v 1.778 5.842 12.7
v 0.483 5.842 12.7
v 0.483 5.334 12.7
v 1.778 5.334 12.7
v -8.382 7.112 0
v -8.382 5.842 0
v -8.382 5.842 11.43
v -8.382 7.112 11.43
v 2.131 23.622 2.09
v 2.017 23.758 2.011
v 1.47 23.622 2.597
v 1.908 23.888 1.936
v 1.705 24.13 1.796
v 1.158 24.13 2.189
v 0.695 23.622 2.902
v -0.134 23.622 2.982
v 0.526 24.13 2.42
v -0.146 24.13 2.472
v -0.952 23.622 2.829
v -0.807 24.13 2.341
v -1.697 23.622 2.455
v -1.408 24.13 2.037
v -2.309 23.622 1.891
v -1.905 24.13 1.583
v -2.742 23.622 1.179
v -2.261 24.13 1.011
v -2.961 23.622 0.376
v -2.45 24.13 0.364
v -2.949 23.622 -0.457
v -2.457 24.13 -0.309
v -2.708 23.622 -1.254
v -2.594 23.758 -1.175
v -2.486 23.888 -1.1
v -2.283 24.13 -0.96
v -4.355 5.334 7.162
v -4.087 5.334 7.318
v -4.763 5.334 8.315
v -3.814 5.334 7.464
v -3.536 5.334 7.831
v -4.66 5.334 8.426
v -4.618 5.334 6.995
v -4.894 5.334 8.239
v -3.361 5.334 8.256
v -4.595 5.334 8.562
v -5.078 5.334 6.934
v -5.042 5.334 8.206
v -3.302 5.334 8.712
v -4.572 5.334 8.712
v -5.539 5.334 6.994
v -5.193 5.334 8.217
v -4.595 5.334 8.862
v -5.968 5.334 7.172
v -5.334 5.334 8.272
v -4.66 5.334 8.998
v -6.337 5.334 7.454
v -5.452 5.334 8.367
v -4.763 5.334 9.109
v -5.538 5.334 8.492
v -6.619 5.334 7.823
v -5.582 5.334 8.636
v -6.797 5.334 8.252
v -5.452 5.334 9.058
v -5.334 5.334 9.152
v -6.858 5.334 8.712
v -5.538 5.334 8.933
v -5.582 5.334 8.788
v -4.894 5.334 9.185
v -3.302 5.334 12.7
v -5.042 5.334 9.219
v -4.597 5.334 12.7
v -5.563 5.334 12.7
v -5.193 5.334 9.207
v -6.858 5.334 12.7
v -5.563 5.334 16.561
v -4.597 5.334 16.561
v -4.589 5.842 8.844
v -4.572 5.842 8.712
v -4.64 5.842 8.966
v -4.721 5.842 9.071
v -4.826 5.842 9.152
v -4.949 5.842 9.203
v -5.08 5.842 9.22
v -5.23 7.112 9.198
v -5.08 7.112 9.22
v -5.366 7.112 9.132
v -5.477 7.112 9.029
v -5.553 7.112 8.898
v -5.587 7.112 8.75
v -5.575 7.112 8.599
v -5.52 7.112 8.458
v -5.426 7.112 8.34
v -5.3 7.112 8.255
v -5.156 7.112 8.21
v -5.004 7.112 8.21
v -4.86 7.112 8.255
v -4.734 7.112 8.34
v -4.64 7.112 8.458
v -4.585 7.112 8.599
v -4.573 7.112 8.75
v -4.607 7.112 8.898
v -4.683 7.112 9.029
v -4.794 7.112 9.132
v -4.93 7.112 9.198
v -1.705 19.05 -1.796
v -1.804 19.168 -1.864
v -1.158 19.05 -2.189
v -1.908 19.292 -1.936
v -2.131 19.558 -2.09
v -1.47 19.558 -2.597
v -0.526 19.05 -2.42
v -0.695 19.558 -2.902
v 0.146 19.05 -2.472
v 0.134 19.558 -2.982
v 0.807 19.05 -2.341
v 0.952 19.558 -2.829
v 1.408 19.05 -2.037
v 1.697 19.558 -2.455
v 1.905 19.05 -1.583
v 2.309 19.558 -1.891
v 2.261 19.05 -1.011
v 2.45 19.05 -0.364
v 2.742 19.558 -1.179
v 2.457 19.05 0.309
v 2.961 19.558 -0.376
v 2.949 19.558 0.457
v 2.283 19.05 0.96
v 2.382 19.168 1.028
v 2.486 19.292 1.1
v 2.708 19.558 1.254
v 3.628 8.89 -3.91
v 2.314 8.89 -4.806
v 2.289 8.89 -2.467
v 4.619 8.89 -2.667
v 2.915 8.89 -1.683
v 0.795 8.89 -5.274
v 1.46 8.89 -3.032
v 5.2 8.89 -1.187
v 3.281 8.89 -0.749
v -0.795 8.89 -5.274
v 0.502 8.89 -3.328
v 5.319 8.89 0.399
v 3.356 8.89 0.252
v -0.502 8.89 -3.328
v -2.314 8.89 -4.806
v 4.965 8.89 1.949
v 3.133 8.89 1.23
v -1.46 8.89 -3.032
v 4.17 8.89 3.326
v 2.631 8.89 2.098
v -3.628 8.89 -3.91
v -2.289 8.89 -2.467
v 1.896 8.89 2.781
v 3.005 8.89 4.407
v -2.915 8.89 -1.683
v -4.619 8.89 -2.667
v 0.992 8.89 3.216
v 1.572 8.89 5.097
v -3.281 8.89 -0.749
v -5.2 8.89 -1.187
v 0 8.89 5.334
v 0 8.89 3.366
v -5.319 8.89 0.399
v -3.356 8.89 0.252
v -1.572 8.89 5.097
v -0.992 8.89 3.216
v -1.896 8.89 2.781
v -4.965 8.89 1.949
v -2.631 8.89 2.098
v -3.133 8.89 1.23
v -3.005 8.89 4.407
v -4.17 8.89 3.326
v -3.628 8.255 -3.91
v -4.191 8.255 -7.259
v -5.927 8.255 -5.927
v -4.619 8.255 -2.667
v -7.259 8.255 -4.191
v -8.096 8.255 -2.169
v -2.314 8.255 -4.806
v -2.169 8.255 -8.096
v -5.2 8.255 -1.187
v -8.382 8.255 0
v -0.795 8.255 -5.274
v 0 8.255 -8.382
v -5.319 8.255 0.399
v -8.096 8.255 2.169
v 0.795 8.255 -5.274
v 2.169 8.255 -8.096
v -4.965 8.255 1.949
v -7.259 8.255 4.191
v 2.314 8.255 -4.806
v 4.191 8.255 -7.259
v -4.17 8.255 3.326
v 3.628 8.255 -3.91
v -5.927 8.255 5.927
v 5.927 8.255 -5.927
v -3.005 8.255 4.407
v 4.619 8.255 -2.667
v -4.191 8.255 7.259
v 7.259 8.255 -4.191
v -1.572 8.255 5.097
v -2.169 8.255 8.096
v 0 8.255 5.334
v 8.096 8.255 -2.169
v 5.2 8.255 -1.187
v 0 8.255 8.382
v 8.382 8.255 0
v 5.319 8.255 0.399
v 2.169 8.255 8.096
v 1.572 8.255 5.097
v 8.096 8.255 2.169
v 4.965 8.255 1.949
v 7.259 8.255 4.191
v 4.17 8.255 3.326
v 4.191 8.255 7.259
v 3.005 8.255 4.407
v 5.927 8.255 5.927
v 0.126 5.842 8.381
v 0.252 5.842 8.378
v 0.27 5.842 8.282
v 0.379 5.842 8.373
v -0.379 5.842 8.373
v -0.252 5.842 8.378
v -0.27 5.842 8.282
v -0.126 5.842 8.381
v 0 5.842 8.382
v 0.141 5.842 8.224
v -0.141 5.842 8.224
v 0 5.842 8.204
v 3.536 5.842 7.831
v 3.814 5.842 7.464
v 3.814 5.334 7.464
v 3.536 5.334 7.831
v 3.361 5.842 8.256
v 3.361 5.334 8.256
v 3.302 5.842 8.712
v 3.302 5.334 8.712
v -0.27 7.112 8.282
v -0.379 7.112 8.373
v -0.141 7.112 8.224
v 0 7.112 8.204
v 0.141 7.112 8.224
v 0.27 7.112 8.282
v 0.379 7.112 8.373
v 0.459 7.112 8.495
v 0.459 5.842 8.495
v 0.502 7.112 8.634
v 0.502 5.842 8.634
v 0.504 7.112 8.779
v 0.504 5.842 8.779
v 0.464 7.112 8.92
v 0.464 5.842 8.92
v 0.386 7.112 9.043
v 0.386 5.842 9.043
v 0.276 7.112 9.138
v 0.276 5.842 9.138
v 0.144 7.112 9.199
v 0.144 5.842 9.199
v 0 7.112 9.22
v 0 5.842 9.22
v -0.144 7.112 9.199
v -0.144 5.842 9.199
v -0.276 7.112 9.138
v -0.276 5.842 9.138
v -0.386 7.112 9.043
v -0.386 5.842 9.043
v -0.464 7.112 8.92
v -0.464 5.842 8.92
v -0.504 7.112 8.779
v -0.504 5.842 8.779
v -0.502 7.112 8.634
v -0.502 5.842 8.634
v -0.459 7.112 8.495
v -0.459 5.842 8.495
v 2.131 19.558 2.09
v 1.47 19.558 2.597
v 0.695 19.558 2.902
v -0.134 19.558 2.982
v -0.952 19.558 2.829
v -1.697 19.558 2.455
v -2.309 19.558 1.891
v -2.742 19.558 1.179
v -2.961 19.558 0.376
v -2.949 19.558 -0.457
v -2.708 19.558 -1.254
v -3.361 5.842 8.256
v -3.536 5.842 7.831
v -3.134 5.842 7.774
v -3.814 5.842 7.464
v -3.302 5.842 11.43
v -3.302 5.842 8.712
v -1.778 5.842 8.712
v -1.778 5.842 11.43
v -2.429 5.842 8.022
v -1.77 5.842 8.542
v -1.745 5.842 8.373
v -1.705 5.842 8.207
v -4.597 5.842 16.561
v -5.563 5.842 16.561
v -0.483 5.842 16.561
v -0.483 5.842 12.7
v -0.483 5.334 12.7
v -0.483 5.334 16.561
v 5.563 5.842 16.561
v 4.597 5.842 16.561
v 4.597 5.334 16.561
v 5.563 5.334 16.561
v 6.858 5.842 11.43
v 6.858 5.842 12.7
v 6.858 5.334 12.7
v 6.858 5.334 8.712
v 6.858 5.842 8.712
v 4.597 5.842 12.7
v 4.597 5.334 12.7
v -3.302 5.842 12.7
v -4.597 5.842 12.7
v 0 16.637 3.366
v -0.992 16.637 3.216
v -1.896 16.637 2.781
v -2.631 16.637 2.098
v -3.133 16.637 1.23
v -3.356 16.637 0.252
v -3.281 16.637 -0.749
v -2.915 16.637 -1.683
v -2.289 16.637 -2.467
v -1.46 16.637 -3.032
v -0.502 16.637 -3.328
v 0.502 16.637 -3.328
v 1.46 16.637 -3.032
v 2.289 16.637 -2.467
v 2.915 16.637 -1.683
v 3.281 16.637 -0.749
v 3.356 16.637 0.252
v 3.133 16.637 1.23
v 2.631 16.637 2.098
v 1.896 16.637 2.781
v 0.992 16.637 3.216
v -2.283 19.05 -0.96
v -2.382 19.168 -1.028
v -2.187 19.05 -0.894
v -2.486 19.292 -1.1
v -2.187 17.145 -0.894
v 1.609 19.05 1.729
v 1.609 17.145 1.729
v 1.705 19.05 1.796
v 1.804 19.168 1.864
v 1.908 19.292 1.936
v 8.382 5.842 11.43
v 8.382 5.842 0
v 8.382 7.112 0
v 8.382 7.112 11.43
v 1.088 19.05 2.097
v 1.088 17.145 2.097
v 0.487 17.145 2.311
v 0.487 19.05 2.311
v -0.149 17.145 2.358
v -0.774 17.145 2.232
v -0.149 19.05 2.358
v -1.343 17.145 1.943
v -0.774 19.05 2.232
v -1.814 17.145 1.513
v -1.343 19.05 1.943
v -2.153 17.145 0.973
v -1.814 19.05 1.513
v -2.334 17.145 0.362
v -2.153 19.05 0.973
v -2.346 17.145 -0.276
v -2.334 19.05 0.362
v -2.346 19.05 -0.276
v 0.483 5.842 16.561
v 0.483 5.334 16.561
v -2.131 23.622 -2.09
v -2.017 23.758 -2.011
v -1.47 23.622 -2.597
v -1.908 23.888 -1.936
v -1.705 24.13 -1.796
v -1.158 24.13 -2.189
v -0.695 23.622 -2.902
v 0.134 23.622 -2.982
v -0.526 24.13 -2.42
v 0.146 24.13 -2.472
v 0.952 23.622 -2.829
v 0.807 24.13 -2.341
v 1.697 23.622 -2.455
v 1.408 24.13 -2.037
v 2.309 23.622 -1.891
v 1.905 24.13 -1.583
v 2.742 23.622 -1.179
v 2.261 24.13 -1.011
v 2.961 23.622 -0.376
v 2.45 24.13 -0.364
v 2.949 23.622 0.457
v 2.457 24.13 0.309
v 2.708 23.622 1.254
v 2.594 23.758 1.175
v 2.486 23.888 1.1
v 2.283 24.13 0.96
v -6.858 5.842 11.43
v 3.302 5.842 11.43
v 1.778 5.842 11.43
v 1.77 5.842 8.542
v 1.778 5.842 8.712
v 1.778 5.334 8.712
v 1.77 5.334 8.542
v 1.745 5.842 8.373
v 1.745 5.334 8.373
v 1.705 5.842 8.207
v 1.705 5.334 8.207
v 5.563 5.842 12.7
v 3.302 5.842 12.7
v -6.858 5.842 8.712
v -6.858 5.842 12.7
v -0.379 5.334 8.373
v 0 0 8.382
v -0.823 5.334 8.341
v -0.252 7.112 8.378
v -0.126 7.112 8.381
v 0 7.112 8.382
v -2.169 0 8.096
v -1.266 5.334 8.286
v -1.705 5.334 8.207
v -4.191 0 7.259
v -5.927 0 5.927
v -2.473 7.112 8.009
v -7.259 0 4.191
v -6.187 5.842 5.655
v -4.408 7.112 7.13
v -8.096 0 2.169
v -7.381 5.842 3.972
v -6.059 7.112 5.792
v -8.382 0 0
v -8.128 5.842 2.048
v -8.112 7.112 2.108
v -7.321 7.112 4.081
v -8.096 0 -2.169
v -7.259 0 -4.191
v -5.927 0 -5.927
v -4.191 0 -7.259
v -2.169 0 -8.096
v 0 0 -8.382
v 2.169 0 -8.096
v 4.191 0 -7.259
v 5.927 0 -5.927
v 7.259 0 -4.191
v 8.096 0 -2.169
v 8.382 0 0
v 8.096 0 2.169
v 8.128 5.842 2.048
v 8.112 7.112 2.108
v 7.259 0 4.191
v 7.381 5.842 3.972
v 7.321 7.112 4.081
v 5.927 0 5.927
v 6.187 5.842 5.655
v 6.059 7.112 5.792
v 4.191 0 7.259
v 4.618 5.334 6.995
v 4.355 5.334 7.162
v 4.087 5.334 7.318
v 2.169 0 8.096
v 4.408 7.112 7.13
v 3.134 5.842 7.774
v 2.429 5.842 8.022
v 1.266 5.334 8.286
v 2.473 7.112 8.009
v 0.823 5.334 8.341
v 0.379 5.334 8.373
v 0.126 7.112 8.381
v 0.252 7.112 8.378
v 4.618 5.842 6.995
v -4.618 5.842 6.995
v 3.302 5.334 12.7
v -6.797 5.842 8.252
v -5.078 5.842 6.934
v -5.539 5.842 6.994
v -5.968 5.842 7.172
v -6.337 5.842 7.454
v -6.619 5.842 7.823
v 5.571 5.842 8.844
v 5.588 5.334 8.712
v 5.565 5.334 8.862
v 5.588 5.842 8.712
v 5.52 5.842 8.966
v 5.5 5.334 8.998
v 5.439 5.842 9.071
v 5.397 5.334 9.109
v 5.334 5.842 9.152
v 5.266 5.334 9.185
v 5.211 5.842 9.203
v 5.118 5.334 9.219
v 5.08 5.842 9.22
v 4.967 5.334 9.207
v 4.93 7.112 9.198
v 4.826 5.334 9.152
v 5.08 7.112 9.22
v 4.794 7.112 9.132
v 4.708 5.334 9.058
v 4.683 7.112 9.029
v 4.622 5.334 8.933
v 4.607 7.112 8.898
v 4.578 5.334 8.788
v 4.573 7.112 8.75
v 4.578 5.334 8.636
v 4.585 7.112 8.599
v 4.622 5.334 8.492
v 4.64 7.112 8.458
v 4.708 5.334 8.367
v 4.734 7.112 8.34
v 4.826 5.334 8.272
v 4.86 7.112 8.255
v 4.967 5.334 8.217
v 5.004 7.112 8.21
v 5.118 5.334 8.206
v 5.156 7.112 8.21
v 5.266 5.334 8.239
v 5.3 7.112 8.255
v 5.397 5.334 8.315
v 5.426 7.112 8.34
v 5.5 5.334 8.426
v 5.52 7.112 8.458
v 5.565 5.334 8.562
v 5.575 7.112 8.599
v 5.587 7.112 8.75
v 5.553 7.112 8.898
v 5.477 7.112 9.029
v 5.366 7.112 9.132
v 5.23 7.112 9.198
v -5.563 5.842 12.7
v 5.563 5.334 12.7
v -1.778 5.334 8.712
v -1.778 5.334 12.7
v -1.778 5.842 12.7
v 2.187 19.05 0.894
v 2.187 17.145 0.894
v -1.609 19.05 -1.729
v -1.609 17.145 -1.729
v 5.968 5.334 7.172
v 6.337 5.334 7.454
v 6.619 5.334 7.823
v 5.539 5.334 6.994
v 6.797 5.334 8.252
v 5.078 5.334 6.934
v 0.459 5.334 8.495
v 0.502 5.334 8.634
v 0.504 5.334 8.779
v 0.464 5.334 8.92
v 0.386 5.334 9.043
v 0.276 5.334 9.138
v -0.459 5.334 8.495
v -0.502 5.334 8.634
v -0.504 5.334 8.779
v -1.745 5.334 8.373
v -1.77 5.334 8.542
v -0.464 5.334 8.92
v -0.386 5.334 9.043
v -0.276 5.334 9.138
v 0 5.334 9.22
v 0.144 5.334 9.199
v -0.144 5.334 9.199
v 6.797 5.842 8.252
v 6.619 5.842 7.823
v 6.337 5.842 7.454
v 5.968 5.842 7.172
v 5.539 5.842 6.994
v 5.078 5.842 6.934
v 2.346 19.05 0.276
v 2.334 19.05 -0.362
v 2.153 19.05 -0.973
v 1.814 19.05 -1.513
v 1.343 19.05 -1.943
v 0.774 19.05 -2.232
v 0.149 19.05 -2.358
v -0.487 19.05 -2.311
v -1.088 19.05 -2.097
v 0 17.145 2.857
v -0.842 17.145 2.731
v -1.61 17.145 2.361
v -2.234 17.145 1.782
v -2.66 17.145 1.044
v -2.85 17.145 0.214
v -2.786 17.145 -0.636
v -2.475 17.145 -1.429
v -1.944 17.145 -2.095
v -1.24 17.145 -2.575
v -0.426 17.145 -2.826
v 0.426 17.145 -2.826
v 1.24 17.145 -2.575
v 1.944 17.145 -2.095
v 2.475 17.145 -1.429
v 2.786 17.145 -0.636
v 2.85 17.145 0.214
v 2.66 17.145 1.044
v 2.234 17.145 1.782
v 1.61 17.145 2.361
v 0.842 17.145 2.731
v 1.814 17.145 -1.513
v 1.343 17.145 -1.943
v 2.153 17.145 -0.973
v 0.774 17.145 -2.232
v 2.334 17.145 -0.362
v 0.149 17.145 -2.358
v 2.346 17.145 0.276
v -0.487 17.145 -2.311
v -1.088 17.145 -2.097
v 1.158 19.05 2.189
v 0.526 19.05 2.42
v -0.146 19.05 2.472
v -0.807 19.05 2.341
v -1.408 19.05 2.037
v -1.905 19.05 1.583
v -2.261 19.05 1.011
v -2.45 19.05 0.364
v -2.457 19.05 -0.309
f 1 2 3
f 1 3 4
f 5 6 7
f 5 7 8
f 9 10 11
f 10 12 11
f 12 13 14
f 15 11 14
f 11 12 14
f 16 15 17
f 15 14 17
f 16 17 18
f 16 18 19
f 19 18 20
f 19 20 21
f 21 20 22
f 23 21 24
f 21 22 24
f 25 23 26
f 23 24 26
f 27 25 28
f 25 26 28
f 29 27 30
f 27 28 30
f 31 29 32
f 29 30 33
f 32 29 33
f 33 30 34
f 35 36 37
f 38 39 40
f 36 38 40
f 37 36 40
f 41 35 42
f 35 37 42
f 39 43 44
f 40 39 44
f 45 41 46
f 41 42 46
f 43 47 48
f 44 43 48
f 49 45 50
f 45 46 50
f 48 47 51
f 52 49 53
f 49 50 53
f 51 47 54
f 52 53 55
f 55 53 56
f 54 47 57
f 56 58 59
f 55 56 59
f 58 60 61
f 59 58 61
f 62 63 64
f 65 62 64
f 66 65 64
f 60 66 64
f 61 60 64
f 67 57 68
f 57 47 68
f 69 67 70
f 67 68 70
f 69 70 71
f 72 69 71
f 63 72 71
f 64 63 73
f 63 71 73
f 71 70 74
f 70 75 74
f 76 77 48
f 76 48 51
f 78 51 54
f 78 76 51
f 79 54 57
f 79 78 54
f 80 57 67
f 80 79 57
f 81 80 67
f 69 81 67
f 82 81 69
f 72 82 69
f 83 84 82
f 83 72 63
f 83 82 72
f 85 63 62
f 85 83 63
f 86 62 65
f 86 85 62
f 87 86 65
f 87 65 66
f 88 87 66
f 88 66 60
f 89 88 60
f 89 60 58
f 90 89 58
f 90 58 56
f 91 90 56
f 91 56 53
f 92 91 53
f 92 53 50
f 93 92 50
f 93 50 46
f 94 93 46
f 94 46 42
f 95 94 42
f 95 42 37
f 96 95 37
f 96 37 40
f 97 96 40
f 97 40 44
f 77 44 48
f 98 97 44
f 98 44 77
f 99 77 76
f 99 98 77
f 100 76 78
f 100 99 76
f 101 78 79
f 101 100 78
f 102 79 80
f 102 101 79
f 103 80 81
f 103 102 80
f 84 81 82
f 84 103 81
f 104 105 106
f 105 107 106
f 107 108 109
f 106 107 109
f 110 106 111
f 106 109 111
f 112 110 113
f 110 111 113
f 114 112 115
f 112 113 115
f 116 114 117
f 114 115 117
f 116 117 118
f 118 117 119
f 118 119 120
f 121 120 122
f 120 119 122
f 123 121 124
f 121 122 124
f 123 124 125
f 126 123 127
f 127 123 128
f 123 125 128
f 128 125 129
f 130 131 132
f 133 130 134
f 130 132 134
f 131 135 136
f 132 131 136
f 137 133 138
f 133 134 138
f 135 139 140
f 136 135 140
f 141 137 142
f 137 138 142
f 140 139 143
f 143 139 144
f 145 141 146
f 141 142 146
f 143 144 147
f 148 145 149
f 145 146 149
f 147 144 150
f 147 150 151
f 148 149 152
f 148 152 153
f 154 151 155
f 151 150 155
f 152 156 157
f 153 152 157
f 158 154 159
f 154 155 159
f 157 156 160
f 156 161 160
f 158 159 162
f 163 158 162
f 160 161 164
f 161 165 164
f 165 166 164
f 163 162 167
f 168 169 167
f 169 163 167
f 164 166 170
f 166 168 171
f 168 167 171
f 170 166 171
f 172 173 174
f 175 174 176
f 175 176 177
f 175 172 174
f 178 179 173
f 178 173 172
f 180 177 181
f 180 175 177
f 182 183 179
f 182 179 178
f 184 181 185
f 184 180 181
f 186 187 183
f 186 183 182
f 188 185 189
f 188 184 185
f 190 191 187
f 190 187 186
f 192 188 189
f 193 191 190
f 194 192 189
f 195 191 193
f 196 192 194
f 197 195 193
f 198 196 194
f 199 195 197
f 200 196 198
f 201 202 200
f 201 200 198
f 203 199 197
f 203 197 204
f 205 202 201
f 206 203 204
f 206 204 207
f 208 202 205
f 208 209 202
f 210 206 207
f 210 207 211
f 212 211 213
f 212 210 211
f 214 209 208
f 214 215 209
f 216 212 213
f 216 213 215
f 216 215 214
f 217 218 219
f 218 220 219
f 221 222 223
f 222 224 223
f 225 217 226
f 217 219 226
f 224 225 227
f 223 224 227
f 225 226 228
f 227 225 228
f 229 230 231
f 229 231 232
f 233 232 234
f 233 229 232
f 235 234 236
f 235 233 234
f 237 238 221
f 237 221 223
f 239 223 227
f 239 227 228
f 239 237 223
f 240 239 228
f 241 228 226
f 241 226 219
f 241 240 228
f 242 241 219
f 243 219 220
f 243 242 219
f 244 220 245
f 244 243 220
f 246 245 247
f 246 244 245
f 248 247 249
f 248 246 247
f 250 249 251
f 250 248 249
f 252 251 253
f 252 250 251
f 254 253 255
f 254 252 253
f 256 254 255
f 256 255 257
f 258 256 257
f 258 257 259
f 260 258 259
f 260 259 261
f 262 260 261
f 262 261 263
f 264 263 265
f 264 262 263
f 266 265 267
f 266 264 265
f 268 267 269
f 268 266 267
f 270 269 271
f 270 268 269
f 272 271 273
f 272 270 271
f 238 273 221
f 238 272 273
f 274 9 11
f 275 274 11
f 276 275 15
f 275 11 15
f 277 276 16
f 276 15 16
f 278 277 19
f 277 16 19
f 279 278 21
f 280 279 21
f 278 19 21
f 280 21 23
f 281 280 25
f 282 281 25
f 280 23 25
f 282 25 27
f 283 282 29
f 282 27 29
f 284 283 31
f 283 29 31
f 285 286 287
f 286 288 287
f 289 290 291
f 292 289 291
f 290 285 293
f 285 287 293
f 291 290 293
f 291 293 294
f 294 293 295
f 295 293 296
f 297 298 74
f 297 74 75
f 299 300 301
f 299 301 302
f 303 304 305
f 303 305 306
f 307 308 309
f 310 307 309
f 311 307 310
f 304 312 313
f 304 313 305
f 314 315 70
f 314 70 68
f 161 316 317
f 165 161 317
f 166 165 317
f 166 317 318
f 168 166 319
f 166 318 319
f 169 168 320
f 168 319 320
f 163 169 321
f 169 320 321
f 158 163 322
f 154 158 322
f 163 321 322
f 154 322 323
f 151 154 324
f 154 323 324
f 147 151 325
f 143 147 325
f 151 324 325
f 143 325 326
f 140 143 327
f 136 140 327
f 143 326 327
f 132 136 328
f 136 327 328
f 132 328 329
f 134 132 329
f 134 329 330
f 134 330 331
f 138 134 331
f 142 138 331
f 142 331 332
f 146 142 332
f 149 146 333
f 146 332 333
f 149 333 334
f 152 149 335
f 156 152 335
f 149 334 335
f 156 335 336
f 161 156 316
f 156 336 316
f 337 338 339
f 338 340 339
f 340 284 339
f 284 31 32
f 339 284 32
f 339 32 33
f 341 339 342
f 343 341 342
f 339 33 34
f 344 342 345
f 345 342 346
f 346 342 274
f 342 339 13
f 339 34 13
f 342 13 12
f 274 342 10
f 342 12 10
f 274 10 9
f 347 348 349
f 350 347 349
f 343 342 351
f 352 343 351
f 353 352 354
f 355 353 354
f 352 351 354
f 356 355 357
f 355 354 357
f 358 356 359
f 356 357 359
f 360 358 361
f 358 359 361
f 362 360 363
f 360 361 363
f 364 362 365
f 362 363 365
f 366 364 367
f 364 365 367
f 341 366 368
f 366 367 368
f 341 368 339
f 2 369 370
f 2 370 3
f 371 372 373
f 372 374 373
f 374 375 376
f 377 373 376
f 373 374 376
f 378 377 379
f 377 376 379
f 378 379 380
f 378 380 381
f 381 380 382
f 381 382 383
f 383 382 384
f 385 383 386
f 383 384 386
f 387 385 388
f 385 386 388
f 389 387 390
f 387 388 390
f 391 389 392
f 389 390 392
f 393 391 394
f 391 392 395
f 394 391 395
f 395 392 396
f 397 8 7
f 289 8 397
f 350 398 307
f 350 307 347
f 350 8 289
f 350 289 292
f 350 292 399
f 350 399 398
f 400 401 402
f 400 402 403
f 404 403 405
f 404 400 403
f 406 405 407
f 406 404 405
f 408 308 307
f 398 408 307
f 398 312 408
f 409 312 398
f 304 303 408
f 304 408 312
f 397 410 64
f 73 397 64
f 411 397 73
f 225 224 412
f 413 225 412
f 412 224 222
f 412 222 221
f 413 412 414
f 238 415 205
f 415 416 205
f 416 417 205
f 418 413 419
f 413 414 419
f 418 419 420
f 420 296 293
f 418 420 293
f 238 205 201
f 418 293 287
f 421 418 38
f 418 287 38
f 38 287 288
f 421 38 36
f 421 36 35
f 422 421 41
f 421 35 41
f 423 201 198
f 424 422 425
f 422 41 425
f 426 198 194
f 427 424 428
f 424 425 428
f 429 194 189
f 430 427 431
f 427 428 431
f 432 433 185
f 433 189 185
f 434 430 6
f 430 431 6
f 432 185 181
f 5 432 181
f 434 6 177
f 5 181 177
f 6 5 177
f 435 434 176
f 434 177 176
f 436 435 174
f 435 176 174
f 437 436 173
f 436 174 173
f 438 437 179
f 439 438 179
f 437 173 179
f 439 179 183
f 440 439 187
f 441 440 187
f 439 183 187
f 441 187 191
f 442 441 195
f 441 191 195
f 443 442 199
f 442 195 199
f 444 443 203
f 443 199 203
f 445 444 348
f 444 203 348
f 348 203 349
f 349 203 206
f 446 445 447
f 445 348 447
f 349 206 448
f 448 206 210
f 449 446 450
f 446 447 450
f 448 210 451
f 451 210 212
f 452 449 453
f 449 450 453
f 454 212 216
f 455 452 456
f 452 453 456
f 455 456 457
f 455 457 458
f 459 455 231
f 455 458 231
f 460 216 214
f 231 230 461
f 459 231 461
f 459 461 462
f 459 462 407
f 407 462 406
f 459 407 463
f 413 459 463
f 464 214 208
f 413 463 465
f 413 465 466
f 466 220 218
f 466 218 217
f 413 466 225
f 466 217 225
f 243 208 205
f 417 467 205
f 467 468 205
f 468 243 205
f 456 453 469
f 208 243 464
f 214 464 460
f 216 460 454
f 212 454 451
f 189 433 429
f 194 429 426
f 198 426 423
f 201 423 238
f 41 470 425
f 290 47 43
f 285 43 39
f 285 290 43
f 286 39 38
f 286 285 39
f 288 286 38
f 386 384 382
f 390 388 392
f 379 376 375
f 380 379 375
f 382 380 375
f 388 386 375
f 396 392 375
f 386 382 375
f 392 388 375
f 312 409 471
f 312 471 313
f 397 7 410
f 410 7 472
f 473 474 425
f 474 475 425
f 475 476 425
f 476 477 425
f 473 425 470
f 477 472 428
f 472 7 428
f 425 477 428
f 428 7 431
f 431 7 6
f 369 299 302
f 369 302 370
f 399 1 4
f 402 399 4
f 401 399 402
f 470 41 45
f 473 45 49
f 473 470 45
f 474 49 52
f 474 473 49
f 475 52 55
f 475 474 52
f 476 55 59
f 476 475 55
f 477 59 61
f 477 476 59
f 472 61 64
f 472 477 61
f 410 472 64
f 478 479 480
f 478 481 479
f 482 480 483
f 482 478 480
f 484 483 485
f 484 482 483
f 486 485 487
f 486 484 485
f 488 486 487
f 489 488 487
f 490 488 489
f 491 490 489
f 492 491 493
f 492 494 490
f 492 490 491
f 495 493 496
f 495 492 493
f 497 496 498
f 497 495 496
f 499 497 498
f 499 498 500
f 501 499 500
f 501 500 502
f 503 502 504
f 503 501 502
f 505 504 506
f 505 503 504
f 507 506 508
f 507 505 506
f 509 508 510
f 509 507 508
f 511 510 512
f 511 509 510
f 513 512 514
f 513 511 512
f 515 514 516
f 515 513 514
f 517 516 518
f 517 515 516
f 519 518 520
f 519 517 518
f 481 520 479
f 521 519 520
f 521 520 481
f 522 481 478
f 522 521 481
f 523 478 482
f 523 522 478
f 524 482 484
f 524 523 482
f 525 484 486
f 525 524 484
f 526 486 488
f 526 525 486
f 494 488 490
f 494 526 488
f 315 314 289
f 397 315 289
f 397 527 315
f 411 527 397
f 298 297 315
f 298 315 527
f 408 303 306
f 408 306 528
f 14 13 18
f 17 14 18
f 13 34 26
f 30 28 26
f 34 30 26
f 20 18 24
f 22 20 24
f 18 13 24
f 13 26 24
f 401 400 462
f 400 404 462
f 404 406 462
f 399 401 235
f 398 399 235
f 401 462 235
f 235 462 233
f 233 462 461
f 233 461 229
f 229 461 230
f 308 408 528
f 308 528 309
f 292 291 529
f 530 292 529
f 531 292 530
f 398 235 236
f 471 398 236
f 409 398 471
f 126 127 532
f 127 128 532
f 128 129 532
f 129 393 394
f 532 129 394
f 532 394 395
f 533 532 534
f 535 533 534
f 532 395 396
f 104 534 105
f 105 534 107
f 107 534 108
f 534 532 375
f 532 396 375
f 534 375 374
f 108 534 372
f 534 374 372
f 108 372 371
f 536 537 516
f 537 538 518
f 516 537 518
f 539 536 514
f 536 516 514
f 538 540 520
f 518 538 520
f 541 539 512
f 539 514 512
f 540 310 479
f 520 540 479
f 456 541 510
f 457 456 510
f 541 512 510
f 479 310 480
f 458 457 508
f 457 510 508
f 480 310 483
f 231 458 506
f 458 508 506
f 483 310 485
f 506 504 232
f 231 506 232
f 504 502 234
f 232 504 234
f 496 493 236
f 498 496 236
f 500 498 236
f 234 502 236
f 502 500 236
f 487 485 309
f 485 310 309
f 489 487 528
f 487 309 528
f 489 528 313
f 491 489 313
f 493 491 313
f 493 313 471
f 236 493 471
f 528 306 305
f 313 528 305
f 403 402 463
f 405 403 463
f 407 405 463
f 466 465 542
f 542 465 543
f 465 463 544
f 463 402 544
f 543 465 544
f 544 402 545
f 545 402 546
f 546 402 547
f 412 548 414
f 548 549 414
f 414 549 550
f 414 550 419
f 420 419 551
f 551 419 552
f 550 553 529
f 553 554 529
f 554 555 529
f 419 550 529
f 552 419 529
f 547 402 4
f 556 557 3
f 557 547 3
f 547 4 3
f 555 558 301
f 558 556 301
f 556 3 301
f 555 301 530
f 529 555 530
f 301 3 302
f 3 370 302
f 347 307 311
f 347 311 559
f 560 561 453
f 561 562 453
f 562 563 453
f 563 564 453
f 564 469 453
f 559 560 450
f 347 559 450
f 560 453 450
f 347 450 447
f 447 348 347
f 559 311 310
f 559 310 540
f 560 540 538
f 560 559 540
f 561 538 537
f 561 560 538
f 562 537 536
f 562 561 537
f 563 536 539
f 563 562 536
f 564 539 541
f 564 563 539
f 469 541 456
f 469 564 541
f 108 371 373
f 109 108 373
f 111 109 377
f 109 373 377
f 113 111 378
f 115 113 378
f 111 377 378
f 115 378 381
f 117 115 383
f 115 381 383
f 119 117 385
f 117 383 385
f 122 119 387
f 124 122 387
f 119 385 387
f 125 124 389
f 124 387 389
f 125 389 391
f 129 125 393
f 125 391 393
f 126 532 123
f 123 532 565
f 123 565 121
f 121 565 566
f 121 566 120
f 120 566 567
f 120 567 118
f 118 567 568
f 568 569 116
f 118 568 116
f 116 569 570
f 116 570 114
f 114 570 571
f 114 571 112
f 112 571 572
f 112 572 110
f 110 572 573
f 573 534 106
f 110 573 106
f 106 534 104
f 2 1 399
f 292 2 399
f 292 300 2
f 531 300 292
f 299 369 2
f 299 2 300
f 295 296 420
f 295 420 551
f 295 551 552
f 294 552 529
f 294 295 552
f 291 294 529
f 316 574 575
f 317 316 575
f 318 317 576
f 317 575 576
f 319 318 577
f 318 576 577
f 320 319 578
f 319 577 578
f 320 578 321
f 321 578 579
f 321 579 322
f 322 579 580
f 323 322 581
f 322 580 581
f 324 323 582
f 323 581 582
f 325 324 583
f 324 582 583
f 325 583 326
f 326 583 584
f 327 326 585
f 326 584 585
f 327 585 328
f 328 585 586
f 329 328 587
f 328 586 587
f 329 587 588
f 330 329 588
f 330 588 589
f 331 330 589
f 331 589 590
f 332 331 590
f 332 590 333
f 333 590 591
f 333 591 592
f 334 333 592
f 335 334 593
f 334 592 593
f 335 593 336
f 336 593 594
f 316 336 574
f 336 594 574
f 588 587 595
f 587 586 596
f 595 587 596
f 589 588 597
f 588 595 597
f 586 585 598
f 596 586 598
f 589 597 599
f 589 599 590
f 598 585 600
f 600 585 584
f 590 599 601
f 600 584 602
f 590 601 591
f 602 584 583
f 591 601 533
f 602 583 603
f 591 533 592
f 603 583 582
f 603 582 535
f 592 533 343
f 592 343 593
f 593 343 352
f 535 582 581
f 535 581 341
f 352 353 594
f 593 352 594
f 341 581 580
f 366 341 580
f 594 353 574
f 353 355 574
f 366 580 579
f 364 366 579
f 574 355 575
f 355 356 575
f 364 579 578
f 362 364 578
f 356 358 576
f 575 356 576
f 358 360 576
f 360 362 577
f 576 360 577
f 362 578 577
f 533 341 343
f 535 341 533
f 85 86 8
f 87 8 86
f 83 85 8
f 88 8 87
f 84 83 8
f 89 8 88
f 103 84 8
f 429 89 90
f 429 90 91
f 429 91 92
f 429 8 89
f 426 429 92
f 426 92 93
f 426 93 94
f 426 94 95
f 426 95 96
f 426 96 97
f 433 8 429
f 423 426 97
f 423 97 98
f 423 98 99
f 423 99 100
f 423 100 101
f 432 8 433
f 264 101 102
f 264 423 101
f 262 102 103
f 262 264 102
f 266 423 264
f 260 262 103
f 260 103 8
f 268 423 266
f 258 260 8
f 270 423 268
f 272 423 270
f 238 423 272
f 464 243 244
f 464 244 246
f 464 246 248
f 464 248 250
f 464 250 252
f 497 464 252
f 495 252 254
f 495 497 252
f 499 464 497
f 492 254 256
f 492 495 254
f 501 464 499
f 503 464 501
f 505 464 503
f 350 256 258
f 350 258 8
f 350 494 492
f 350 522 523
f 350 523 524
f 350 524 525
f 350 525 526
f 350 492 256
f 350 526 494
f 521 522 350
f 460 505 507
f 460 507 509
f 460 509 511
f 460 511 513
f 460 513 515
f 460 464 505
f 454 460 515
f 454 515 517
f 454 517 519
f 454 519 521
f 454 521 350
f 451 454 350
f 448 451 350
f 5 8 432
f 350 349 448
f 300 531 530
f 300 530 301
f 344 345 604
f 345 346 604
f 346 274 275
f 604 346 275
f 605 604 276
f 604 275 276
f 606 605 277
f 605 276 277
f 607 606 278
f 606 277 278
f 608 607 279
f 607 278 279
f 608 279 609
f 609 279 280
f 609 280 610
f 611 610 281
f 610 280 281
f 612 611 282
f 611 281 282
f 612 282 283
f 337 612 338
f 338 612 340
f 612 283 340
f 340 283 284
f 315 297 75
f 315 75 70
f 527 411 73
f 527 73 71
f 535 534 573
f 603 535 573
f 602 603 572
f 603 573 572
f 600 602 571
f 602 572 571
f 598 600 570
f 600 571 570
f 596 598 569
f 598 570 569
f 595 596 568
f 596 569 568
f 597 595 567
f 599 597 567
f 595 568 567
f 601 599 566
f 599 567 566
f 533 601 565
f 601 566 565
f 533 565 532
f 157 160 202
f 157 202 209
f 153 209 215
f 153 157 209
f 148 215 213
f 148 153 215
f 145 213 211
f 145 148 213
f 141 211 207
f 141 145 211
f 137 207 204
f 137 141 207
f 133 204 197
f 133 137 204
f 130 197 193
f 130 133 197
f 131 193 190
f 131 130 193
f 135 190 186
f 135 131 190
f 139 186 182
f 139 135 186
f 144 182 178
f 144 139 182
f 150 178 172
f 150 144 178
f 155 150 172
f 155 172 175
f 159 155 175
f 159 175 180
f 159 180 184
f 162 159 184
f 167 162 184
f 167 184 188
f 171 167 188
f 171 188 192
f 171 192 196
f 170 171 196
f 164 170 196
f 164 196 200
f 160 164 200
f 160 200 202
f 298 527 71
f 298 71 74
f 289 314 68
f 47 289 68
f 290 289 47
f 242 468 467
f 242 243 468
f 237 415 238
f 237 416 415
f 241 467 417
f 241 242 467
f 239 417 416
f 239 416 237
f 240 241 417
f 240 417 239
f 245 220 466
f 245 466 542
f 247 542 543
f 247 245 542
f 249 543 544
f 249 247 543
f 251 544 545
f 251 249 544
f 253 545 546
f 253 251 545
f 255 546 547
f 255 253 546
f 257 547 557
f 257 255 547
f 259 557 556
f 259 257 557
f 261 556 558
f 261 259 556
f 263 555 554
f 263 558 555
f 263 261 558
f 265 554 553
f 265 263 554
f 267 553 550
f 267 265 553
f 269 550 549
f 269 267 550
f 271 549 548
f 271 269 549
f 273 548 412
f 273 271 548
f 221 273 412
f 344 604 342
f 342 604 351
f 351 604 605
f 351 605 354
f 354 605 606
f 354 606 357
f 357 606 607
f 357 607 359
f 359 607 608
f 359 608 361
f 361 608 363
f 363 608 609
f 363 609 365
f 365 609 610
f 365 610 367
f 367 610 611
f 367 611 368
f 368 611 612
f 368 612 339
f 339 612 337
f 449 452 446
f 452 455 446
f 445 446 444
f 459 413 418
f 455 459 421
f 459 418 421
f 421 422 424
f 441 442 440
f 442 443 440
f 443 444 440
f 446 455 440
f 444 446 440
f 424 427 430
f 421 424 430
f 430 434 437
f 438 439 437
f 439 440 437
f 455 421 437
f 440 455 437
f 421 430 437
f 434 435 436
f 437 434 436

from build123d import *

# Parameters (mm, degrees)
SKETCH2_W           = 16.764
SKETCH2_H           = 1.27
BOSS_EXTRUDE1_DEPTH = 11.43
SKETCH3_R           = 0.508
BOSS_EXTRUDE2_DEPTH = 0.508
SKETCH5_R           = 8.382
SKETCH5_R_2         = 5.334
CUT_EXTRUDE2_DEPTH  = 15.875
LPATTERN1_COUNT     = 2
LPATTERN1_PITCH     = 5.08
LPATTERN2_COUNT     = 2
LPATTERN2_PITCH     = 5.08
CUT_EXTRUDE3_START  = -1.27
SKETCH7_R           = 0.508
CUT_EXTRUDE3_DEPTH  = 1.27
CUT_EXTRUDE4_DEPTH  = 6.985
CHAMFER1_SIZE       = 0.508


with BuildPart() as part:
    # Sketch1 → Base-Revolve (revolve)
    with BuildSketch(Plane.XY, mode=Mode.PRIVATE) as base_revolve_sk:
        Polygon((0, 0), (8.382, 0), (8.382, 8.89), (3.3655, 8.89), (3.3655, 17.145), (2.3622, 17.145), (2.3622, 19.05), (2.9845, 19.05), (2.9845, 24.13), (0, 24.13), align=None)
    revolve(base_revolve_sk.sketch.rotate(Axis((0, 0, 0), (0, -1, 0)), 90), axis=Axis((0, 0, 0), (0, -1, 0)))

    # Sketch2 → Boss-Extrude1 (add)
    with BuildSketch(Plane.XY):
        with Locations((0, 6.477)):
            Rectangle(SKETCH2_W, SKETCH2_H)
    extrude(amount=BOSS_EXTRUDE1_DEPTH)

    # Sketch3 → Boss-Extrude2 (add)
    with BuildSketch(Plane.XZ.offset(-5.842)):
        with BuildLine():
            Line((-1.778, 12.7), (-0.4826, 12.7))
            Line((-0.4826, 12.7), (-0.4826, 16.5608))
            Line((-0.4826, 16.5608), (0.4826, 16.5608))
            Line((0.4826, 16.5608), (0.4826, 12.7))
            Line((0.4826, 12.7), (1.778, 12.7))
            Line((1.778, 12.7), (1.778, 8.7122))
            ThreePointArc((1.778, 8.7122), (0, 6.9342), (-1.778, 8.7122))
            Line((-1.778, 8.7122), (-1.778, 12.7))
        make_face()
        with Locations((0, 8.7122)):
            Circle(SKETCH3_R, mode=Mode.SUBTRACT)
    boss_extrude2 = extrude(amount=BOSS_EXTRUDE2_DEPTH)

    # Sketch5 → Cut-Extrude2 (cut)
    with BuildSketch(Plane(origin=(0, 24.13, 0), x_dir=(-1, 0, 0), z_dir=(0, 1, 0))):
        with Locations(Location((0, 0, 0), (0, 0, 90))):
            Circle(SKETCH5_R)
        with Locations(Location((0, 0, 0), (0, 0, 90))):
            Circle(SKETCH5_R_2, mode=Mode.SUBTRACT)
    extrude(amount=-CUT_EXTRUDE2_DEPTH, mode=Mode.SUBTRACT)

    # LPattern1: Boss-Extrude2 ×2
    with Locations(*[(-i * LPATTERN1_PITCH, 0, 0) for i in range(1, LPATTERN1_COUNT)]):
        add(boss_extrude2)

    # LPattern2: Boss-Extrude2 ×2
    with Locations(*[(i * LPATTERN2_PITCH, 0, 0) for i in range(1, LPATTERN2_COUNT)]):
        add(boss_extrude2)

    # Sketch7 → Cut-Extrude3 (cut)
    with BuildSketch(Plane.XZ.offset(-5.842).offset(CUT_EXTRUDE3_START)):
        with Locations(Location((-5.08, 8.7122, 0), (0, 0, 90))):
            Circle(SKETCH7_R)
        with Locations(Location((0, 8.7122, 0), (0, 0, 221.82338942))):
            Circle(SKETCH7_R)
        with Locations(Location((5.08, 8.7122, 0), (0, 0, 90))):
            Circle(SKETCH7_R)
    extrude(amount=CUT_EXTRUDE3_DEPTH, mode=Mode.SUBTRACT)

    # Sketch8 → Cut-Extrude4 (cut)
    with BuildSketch(Plane(origin=(0, 24.13, 0), x_dir=(-1, 0, 0), z_dir=(0, 1, 0))):
        with BuildLine():
            Line((-2.708292046, 1.253951532), (2.13071284, -2.089809331))
            ThreePointArc((2.13071284, -2.089809331), (2.455332287, -1.696638916), (2.708292046, -1.253951532))
            Line((2.708292046, -1.253951532), (-2.13071284, 2.089809331))
            ThreePointArc((-2.13071284, 2.089809331), (-2.455332287, 1.696638916), (-2.708292046, 1.253951532))
        make_face()
    extrude(amount=-CUT_EXTRUDE4_DEPTH, mode=Mode.SUBTRACT)

    # Chamfer1
    chamfer1_edges = [part.edges().sort_by_distance(p)[0] for p in [
        (1.696638916, 24.13, -2.455332287),
        (-2.51492133, 24.13, 1.606988162),
        (1.696638916, 19.05, -2.455332287),
        (-2.51492133, 19.05, 1.606988162),
        (0, 17.145, -3.3655),
    ]]
    chamfer(chamfer1_edges, length=CHAMFER1_SIZE)


solid = part.part
